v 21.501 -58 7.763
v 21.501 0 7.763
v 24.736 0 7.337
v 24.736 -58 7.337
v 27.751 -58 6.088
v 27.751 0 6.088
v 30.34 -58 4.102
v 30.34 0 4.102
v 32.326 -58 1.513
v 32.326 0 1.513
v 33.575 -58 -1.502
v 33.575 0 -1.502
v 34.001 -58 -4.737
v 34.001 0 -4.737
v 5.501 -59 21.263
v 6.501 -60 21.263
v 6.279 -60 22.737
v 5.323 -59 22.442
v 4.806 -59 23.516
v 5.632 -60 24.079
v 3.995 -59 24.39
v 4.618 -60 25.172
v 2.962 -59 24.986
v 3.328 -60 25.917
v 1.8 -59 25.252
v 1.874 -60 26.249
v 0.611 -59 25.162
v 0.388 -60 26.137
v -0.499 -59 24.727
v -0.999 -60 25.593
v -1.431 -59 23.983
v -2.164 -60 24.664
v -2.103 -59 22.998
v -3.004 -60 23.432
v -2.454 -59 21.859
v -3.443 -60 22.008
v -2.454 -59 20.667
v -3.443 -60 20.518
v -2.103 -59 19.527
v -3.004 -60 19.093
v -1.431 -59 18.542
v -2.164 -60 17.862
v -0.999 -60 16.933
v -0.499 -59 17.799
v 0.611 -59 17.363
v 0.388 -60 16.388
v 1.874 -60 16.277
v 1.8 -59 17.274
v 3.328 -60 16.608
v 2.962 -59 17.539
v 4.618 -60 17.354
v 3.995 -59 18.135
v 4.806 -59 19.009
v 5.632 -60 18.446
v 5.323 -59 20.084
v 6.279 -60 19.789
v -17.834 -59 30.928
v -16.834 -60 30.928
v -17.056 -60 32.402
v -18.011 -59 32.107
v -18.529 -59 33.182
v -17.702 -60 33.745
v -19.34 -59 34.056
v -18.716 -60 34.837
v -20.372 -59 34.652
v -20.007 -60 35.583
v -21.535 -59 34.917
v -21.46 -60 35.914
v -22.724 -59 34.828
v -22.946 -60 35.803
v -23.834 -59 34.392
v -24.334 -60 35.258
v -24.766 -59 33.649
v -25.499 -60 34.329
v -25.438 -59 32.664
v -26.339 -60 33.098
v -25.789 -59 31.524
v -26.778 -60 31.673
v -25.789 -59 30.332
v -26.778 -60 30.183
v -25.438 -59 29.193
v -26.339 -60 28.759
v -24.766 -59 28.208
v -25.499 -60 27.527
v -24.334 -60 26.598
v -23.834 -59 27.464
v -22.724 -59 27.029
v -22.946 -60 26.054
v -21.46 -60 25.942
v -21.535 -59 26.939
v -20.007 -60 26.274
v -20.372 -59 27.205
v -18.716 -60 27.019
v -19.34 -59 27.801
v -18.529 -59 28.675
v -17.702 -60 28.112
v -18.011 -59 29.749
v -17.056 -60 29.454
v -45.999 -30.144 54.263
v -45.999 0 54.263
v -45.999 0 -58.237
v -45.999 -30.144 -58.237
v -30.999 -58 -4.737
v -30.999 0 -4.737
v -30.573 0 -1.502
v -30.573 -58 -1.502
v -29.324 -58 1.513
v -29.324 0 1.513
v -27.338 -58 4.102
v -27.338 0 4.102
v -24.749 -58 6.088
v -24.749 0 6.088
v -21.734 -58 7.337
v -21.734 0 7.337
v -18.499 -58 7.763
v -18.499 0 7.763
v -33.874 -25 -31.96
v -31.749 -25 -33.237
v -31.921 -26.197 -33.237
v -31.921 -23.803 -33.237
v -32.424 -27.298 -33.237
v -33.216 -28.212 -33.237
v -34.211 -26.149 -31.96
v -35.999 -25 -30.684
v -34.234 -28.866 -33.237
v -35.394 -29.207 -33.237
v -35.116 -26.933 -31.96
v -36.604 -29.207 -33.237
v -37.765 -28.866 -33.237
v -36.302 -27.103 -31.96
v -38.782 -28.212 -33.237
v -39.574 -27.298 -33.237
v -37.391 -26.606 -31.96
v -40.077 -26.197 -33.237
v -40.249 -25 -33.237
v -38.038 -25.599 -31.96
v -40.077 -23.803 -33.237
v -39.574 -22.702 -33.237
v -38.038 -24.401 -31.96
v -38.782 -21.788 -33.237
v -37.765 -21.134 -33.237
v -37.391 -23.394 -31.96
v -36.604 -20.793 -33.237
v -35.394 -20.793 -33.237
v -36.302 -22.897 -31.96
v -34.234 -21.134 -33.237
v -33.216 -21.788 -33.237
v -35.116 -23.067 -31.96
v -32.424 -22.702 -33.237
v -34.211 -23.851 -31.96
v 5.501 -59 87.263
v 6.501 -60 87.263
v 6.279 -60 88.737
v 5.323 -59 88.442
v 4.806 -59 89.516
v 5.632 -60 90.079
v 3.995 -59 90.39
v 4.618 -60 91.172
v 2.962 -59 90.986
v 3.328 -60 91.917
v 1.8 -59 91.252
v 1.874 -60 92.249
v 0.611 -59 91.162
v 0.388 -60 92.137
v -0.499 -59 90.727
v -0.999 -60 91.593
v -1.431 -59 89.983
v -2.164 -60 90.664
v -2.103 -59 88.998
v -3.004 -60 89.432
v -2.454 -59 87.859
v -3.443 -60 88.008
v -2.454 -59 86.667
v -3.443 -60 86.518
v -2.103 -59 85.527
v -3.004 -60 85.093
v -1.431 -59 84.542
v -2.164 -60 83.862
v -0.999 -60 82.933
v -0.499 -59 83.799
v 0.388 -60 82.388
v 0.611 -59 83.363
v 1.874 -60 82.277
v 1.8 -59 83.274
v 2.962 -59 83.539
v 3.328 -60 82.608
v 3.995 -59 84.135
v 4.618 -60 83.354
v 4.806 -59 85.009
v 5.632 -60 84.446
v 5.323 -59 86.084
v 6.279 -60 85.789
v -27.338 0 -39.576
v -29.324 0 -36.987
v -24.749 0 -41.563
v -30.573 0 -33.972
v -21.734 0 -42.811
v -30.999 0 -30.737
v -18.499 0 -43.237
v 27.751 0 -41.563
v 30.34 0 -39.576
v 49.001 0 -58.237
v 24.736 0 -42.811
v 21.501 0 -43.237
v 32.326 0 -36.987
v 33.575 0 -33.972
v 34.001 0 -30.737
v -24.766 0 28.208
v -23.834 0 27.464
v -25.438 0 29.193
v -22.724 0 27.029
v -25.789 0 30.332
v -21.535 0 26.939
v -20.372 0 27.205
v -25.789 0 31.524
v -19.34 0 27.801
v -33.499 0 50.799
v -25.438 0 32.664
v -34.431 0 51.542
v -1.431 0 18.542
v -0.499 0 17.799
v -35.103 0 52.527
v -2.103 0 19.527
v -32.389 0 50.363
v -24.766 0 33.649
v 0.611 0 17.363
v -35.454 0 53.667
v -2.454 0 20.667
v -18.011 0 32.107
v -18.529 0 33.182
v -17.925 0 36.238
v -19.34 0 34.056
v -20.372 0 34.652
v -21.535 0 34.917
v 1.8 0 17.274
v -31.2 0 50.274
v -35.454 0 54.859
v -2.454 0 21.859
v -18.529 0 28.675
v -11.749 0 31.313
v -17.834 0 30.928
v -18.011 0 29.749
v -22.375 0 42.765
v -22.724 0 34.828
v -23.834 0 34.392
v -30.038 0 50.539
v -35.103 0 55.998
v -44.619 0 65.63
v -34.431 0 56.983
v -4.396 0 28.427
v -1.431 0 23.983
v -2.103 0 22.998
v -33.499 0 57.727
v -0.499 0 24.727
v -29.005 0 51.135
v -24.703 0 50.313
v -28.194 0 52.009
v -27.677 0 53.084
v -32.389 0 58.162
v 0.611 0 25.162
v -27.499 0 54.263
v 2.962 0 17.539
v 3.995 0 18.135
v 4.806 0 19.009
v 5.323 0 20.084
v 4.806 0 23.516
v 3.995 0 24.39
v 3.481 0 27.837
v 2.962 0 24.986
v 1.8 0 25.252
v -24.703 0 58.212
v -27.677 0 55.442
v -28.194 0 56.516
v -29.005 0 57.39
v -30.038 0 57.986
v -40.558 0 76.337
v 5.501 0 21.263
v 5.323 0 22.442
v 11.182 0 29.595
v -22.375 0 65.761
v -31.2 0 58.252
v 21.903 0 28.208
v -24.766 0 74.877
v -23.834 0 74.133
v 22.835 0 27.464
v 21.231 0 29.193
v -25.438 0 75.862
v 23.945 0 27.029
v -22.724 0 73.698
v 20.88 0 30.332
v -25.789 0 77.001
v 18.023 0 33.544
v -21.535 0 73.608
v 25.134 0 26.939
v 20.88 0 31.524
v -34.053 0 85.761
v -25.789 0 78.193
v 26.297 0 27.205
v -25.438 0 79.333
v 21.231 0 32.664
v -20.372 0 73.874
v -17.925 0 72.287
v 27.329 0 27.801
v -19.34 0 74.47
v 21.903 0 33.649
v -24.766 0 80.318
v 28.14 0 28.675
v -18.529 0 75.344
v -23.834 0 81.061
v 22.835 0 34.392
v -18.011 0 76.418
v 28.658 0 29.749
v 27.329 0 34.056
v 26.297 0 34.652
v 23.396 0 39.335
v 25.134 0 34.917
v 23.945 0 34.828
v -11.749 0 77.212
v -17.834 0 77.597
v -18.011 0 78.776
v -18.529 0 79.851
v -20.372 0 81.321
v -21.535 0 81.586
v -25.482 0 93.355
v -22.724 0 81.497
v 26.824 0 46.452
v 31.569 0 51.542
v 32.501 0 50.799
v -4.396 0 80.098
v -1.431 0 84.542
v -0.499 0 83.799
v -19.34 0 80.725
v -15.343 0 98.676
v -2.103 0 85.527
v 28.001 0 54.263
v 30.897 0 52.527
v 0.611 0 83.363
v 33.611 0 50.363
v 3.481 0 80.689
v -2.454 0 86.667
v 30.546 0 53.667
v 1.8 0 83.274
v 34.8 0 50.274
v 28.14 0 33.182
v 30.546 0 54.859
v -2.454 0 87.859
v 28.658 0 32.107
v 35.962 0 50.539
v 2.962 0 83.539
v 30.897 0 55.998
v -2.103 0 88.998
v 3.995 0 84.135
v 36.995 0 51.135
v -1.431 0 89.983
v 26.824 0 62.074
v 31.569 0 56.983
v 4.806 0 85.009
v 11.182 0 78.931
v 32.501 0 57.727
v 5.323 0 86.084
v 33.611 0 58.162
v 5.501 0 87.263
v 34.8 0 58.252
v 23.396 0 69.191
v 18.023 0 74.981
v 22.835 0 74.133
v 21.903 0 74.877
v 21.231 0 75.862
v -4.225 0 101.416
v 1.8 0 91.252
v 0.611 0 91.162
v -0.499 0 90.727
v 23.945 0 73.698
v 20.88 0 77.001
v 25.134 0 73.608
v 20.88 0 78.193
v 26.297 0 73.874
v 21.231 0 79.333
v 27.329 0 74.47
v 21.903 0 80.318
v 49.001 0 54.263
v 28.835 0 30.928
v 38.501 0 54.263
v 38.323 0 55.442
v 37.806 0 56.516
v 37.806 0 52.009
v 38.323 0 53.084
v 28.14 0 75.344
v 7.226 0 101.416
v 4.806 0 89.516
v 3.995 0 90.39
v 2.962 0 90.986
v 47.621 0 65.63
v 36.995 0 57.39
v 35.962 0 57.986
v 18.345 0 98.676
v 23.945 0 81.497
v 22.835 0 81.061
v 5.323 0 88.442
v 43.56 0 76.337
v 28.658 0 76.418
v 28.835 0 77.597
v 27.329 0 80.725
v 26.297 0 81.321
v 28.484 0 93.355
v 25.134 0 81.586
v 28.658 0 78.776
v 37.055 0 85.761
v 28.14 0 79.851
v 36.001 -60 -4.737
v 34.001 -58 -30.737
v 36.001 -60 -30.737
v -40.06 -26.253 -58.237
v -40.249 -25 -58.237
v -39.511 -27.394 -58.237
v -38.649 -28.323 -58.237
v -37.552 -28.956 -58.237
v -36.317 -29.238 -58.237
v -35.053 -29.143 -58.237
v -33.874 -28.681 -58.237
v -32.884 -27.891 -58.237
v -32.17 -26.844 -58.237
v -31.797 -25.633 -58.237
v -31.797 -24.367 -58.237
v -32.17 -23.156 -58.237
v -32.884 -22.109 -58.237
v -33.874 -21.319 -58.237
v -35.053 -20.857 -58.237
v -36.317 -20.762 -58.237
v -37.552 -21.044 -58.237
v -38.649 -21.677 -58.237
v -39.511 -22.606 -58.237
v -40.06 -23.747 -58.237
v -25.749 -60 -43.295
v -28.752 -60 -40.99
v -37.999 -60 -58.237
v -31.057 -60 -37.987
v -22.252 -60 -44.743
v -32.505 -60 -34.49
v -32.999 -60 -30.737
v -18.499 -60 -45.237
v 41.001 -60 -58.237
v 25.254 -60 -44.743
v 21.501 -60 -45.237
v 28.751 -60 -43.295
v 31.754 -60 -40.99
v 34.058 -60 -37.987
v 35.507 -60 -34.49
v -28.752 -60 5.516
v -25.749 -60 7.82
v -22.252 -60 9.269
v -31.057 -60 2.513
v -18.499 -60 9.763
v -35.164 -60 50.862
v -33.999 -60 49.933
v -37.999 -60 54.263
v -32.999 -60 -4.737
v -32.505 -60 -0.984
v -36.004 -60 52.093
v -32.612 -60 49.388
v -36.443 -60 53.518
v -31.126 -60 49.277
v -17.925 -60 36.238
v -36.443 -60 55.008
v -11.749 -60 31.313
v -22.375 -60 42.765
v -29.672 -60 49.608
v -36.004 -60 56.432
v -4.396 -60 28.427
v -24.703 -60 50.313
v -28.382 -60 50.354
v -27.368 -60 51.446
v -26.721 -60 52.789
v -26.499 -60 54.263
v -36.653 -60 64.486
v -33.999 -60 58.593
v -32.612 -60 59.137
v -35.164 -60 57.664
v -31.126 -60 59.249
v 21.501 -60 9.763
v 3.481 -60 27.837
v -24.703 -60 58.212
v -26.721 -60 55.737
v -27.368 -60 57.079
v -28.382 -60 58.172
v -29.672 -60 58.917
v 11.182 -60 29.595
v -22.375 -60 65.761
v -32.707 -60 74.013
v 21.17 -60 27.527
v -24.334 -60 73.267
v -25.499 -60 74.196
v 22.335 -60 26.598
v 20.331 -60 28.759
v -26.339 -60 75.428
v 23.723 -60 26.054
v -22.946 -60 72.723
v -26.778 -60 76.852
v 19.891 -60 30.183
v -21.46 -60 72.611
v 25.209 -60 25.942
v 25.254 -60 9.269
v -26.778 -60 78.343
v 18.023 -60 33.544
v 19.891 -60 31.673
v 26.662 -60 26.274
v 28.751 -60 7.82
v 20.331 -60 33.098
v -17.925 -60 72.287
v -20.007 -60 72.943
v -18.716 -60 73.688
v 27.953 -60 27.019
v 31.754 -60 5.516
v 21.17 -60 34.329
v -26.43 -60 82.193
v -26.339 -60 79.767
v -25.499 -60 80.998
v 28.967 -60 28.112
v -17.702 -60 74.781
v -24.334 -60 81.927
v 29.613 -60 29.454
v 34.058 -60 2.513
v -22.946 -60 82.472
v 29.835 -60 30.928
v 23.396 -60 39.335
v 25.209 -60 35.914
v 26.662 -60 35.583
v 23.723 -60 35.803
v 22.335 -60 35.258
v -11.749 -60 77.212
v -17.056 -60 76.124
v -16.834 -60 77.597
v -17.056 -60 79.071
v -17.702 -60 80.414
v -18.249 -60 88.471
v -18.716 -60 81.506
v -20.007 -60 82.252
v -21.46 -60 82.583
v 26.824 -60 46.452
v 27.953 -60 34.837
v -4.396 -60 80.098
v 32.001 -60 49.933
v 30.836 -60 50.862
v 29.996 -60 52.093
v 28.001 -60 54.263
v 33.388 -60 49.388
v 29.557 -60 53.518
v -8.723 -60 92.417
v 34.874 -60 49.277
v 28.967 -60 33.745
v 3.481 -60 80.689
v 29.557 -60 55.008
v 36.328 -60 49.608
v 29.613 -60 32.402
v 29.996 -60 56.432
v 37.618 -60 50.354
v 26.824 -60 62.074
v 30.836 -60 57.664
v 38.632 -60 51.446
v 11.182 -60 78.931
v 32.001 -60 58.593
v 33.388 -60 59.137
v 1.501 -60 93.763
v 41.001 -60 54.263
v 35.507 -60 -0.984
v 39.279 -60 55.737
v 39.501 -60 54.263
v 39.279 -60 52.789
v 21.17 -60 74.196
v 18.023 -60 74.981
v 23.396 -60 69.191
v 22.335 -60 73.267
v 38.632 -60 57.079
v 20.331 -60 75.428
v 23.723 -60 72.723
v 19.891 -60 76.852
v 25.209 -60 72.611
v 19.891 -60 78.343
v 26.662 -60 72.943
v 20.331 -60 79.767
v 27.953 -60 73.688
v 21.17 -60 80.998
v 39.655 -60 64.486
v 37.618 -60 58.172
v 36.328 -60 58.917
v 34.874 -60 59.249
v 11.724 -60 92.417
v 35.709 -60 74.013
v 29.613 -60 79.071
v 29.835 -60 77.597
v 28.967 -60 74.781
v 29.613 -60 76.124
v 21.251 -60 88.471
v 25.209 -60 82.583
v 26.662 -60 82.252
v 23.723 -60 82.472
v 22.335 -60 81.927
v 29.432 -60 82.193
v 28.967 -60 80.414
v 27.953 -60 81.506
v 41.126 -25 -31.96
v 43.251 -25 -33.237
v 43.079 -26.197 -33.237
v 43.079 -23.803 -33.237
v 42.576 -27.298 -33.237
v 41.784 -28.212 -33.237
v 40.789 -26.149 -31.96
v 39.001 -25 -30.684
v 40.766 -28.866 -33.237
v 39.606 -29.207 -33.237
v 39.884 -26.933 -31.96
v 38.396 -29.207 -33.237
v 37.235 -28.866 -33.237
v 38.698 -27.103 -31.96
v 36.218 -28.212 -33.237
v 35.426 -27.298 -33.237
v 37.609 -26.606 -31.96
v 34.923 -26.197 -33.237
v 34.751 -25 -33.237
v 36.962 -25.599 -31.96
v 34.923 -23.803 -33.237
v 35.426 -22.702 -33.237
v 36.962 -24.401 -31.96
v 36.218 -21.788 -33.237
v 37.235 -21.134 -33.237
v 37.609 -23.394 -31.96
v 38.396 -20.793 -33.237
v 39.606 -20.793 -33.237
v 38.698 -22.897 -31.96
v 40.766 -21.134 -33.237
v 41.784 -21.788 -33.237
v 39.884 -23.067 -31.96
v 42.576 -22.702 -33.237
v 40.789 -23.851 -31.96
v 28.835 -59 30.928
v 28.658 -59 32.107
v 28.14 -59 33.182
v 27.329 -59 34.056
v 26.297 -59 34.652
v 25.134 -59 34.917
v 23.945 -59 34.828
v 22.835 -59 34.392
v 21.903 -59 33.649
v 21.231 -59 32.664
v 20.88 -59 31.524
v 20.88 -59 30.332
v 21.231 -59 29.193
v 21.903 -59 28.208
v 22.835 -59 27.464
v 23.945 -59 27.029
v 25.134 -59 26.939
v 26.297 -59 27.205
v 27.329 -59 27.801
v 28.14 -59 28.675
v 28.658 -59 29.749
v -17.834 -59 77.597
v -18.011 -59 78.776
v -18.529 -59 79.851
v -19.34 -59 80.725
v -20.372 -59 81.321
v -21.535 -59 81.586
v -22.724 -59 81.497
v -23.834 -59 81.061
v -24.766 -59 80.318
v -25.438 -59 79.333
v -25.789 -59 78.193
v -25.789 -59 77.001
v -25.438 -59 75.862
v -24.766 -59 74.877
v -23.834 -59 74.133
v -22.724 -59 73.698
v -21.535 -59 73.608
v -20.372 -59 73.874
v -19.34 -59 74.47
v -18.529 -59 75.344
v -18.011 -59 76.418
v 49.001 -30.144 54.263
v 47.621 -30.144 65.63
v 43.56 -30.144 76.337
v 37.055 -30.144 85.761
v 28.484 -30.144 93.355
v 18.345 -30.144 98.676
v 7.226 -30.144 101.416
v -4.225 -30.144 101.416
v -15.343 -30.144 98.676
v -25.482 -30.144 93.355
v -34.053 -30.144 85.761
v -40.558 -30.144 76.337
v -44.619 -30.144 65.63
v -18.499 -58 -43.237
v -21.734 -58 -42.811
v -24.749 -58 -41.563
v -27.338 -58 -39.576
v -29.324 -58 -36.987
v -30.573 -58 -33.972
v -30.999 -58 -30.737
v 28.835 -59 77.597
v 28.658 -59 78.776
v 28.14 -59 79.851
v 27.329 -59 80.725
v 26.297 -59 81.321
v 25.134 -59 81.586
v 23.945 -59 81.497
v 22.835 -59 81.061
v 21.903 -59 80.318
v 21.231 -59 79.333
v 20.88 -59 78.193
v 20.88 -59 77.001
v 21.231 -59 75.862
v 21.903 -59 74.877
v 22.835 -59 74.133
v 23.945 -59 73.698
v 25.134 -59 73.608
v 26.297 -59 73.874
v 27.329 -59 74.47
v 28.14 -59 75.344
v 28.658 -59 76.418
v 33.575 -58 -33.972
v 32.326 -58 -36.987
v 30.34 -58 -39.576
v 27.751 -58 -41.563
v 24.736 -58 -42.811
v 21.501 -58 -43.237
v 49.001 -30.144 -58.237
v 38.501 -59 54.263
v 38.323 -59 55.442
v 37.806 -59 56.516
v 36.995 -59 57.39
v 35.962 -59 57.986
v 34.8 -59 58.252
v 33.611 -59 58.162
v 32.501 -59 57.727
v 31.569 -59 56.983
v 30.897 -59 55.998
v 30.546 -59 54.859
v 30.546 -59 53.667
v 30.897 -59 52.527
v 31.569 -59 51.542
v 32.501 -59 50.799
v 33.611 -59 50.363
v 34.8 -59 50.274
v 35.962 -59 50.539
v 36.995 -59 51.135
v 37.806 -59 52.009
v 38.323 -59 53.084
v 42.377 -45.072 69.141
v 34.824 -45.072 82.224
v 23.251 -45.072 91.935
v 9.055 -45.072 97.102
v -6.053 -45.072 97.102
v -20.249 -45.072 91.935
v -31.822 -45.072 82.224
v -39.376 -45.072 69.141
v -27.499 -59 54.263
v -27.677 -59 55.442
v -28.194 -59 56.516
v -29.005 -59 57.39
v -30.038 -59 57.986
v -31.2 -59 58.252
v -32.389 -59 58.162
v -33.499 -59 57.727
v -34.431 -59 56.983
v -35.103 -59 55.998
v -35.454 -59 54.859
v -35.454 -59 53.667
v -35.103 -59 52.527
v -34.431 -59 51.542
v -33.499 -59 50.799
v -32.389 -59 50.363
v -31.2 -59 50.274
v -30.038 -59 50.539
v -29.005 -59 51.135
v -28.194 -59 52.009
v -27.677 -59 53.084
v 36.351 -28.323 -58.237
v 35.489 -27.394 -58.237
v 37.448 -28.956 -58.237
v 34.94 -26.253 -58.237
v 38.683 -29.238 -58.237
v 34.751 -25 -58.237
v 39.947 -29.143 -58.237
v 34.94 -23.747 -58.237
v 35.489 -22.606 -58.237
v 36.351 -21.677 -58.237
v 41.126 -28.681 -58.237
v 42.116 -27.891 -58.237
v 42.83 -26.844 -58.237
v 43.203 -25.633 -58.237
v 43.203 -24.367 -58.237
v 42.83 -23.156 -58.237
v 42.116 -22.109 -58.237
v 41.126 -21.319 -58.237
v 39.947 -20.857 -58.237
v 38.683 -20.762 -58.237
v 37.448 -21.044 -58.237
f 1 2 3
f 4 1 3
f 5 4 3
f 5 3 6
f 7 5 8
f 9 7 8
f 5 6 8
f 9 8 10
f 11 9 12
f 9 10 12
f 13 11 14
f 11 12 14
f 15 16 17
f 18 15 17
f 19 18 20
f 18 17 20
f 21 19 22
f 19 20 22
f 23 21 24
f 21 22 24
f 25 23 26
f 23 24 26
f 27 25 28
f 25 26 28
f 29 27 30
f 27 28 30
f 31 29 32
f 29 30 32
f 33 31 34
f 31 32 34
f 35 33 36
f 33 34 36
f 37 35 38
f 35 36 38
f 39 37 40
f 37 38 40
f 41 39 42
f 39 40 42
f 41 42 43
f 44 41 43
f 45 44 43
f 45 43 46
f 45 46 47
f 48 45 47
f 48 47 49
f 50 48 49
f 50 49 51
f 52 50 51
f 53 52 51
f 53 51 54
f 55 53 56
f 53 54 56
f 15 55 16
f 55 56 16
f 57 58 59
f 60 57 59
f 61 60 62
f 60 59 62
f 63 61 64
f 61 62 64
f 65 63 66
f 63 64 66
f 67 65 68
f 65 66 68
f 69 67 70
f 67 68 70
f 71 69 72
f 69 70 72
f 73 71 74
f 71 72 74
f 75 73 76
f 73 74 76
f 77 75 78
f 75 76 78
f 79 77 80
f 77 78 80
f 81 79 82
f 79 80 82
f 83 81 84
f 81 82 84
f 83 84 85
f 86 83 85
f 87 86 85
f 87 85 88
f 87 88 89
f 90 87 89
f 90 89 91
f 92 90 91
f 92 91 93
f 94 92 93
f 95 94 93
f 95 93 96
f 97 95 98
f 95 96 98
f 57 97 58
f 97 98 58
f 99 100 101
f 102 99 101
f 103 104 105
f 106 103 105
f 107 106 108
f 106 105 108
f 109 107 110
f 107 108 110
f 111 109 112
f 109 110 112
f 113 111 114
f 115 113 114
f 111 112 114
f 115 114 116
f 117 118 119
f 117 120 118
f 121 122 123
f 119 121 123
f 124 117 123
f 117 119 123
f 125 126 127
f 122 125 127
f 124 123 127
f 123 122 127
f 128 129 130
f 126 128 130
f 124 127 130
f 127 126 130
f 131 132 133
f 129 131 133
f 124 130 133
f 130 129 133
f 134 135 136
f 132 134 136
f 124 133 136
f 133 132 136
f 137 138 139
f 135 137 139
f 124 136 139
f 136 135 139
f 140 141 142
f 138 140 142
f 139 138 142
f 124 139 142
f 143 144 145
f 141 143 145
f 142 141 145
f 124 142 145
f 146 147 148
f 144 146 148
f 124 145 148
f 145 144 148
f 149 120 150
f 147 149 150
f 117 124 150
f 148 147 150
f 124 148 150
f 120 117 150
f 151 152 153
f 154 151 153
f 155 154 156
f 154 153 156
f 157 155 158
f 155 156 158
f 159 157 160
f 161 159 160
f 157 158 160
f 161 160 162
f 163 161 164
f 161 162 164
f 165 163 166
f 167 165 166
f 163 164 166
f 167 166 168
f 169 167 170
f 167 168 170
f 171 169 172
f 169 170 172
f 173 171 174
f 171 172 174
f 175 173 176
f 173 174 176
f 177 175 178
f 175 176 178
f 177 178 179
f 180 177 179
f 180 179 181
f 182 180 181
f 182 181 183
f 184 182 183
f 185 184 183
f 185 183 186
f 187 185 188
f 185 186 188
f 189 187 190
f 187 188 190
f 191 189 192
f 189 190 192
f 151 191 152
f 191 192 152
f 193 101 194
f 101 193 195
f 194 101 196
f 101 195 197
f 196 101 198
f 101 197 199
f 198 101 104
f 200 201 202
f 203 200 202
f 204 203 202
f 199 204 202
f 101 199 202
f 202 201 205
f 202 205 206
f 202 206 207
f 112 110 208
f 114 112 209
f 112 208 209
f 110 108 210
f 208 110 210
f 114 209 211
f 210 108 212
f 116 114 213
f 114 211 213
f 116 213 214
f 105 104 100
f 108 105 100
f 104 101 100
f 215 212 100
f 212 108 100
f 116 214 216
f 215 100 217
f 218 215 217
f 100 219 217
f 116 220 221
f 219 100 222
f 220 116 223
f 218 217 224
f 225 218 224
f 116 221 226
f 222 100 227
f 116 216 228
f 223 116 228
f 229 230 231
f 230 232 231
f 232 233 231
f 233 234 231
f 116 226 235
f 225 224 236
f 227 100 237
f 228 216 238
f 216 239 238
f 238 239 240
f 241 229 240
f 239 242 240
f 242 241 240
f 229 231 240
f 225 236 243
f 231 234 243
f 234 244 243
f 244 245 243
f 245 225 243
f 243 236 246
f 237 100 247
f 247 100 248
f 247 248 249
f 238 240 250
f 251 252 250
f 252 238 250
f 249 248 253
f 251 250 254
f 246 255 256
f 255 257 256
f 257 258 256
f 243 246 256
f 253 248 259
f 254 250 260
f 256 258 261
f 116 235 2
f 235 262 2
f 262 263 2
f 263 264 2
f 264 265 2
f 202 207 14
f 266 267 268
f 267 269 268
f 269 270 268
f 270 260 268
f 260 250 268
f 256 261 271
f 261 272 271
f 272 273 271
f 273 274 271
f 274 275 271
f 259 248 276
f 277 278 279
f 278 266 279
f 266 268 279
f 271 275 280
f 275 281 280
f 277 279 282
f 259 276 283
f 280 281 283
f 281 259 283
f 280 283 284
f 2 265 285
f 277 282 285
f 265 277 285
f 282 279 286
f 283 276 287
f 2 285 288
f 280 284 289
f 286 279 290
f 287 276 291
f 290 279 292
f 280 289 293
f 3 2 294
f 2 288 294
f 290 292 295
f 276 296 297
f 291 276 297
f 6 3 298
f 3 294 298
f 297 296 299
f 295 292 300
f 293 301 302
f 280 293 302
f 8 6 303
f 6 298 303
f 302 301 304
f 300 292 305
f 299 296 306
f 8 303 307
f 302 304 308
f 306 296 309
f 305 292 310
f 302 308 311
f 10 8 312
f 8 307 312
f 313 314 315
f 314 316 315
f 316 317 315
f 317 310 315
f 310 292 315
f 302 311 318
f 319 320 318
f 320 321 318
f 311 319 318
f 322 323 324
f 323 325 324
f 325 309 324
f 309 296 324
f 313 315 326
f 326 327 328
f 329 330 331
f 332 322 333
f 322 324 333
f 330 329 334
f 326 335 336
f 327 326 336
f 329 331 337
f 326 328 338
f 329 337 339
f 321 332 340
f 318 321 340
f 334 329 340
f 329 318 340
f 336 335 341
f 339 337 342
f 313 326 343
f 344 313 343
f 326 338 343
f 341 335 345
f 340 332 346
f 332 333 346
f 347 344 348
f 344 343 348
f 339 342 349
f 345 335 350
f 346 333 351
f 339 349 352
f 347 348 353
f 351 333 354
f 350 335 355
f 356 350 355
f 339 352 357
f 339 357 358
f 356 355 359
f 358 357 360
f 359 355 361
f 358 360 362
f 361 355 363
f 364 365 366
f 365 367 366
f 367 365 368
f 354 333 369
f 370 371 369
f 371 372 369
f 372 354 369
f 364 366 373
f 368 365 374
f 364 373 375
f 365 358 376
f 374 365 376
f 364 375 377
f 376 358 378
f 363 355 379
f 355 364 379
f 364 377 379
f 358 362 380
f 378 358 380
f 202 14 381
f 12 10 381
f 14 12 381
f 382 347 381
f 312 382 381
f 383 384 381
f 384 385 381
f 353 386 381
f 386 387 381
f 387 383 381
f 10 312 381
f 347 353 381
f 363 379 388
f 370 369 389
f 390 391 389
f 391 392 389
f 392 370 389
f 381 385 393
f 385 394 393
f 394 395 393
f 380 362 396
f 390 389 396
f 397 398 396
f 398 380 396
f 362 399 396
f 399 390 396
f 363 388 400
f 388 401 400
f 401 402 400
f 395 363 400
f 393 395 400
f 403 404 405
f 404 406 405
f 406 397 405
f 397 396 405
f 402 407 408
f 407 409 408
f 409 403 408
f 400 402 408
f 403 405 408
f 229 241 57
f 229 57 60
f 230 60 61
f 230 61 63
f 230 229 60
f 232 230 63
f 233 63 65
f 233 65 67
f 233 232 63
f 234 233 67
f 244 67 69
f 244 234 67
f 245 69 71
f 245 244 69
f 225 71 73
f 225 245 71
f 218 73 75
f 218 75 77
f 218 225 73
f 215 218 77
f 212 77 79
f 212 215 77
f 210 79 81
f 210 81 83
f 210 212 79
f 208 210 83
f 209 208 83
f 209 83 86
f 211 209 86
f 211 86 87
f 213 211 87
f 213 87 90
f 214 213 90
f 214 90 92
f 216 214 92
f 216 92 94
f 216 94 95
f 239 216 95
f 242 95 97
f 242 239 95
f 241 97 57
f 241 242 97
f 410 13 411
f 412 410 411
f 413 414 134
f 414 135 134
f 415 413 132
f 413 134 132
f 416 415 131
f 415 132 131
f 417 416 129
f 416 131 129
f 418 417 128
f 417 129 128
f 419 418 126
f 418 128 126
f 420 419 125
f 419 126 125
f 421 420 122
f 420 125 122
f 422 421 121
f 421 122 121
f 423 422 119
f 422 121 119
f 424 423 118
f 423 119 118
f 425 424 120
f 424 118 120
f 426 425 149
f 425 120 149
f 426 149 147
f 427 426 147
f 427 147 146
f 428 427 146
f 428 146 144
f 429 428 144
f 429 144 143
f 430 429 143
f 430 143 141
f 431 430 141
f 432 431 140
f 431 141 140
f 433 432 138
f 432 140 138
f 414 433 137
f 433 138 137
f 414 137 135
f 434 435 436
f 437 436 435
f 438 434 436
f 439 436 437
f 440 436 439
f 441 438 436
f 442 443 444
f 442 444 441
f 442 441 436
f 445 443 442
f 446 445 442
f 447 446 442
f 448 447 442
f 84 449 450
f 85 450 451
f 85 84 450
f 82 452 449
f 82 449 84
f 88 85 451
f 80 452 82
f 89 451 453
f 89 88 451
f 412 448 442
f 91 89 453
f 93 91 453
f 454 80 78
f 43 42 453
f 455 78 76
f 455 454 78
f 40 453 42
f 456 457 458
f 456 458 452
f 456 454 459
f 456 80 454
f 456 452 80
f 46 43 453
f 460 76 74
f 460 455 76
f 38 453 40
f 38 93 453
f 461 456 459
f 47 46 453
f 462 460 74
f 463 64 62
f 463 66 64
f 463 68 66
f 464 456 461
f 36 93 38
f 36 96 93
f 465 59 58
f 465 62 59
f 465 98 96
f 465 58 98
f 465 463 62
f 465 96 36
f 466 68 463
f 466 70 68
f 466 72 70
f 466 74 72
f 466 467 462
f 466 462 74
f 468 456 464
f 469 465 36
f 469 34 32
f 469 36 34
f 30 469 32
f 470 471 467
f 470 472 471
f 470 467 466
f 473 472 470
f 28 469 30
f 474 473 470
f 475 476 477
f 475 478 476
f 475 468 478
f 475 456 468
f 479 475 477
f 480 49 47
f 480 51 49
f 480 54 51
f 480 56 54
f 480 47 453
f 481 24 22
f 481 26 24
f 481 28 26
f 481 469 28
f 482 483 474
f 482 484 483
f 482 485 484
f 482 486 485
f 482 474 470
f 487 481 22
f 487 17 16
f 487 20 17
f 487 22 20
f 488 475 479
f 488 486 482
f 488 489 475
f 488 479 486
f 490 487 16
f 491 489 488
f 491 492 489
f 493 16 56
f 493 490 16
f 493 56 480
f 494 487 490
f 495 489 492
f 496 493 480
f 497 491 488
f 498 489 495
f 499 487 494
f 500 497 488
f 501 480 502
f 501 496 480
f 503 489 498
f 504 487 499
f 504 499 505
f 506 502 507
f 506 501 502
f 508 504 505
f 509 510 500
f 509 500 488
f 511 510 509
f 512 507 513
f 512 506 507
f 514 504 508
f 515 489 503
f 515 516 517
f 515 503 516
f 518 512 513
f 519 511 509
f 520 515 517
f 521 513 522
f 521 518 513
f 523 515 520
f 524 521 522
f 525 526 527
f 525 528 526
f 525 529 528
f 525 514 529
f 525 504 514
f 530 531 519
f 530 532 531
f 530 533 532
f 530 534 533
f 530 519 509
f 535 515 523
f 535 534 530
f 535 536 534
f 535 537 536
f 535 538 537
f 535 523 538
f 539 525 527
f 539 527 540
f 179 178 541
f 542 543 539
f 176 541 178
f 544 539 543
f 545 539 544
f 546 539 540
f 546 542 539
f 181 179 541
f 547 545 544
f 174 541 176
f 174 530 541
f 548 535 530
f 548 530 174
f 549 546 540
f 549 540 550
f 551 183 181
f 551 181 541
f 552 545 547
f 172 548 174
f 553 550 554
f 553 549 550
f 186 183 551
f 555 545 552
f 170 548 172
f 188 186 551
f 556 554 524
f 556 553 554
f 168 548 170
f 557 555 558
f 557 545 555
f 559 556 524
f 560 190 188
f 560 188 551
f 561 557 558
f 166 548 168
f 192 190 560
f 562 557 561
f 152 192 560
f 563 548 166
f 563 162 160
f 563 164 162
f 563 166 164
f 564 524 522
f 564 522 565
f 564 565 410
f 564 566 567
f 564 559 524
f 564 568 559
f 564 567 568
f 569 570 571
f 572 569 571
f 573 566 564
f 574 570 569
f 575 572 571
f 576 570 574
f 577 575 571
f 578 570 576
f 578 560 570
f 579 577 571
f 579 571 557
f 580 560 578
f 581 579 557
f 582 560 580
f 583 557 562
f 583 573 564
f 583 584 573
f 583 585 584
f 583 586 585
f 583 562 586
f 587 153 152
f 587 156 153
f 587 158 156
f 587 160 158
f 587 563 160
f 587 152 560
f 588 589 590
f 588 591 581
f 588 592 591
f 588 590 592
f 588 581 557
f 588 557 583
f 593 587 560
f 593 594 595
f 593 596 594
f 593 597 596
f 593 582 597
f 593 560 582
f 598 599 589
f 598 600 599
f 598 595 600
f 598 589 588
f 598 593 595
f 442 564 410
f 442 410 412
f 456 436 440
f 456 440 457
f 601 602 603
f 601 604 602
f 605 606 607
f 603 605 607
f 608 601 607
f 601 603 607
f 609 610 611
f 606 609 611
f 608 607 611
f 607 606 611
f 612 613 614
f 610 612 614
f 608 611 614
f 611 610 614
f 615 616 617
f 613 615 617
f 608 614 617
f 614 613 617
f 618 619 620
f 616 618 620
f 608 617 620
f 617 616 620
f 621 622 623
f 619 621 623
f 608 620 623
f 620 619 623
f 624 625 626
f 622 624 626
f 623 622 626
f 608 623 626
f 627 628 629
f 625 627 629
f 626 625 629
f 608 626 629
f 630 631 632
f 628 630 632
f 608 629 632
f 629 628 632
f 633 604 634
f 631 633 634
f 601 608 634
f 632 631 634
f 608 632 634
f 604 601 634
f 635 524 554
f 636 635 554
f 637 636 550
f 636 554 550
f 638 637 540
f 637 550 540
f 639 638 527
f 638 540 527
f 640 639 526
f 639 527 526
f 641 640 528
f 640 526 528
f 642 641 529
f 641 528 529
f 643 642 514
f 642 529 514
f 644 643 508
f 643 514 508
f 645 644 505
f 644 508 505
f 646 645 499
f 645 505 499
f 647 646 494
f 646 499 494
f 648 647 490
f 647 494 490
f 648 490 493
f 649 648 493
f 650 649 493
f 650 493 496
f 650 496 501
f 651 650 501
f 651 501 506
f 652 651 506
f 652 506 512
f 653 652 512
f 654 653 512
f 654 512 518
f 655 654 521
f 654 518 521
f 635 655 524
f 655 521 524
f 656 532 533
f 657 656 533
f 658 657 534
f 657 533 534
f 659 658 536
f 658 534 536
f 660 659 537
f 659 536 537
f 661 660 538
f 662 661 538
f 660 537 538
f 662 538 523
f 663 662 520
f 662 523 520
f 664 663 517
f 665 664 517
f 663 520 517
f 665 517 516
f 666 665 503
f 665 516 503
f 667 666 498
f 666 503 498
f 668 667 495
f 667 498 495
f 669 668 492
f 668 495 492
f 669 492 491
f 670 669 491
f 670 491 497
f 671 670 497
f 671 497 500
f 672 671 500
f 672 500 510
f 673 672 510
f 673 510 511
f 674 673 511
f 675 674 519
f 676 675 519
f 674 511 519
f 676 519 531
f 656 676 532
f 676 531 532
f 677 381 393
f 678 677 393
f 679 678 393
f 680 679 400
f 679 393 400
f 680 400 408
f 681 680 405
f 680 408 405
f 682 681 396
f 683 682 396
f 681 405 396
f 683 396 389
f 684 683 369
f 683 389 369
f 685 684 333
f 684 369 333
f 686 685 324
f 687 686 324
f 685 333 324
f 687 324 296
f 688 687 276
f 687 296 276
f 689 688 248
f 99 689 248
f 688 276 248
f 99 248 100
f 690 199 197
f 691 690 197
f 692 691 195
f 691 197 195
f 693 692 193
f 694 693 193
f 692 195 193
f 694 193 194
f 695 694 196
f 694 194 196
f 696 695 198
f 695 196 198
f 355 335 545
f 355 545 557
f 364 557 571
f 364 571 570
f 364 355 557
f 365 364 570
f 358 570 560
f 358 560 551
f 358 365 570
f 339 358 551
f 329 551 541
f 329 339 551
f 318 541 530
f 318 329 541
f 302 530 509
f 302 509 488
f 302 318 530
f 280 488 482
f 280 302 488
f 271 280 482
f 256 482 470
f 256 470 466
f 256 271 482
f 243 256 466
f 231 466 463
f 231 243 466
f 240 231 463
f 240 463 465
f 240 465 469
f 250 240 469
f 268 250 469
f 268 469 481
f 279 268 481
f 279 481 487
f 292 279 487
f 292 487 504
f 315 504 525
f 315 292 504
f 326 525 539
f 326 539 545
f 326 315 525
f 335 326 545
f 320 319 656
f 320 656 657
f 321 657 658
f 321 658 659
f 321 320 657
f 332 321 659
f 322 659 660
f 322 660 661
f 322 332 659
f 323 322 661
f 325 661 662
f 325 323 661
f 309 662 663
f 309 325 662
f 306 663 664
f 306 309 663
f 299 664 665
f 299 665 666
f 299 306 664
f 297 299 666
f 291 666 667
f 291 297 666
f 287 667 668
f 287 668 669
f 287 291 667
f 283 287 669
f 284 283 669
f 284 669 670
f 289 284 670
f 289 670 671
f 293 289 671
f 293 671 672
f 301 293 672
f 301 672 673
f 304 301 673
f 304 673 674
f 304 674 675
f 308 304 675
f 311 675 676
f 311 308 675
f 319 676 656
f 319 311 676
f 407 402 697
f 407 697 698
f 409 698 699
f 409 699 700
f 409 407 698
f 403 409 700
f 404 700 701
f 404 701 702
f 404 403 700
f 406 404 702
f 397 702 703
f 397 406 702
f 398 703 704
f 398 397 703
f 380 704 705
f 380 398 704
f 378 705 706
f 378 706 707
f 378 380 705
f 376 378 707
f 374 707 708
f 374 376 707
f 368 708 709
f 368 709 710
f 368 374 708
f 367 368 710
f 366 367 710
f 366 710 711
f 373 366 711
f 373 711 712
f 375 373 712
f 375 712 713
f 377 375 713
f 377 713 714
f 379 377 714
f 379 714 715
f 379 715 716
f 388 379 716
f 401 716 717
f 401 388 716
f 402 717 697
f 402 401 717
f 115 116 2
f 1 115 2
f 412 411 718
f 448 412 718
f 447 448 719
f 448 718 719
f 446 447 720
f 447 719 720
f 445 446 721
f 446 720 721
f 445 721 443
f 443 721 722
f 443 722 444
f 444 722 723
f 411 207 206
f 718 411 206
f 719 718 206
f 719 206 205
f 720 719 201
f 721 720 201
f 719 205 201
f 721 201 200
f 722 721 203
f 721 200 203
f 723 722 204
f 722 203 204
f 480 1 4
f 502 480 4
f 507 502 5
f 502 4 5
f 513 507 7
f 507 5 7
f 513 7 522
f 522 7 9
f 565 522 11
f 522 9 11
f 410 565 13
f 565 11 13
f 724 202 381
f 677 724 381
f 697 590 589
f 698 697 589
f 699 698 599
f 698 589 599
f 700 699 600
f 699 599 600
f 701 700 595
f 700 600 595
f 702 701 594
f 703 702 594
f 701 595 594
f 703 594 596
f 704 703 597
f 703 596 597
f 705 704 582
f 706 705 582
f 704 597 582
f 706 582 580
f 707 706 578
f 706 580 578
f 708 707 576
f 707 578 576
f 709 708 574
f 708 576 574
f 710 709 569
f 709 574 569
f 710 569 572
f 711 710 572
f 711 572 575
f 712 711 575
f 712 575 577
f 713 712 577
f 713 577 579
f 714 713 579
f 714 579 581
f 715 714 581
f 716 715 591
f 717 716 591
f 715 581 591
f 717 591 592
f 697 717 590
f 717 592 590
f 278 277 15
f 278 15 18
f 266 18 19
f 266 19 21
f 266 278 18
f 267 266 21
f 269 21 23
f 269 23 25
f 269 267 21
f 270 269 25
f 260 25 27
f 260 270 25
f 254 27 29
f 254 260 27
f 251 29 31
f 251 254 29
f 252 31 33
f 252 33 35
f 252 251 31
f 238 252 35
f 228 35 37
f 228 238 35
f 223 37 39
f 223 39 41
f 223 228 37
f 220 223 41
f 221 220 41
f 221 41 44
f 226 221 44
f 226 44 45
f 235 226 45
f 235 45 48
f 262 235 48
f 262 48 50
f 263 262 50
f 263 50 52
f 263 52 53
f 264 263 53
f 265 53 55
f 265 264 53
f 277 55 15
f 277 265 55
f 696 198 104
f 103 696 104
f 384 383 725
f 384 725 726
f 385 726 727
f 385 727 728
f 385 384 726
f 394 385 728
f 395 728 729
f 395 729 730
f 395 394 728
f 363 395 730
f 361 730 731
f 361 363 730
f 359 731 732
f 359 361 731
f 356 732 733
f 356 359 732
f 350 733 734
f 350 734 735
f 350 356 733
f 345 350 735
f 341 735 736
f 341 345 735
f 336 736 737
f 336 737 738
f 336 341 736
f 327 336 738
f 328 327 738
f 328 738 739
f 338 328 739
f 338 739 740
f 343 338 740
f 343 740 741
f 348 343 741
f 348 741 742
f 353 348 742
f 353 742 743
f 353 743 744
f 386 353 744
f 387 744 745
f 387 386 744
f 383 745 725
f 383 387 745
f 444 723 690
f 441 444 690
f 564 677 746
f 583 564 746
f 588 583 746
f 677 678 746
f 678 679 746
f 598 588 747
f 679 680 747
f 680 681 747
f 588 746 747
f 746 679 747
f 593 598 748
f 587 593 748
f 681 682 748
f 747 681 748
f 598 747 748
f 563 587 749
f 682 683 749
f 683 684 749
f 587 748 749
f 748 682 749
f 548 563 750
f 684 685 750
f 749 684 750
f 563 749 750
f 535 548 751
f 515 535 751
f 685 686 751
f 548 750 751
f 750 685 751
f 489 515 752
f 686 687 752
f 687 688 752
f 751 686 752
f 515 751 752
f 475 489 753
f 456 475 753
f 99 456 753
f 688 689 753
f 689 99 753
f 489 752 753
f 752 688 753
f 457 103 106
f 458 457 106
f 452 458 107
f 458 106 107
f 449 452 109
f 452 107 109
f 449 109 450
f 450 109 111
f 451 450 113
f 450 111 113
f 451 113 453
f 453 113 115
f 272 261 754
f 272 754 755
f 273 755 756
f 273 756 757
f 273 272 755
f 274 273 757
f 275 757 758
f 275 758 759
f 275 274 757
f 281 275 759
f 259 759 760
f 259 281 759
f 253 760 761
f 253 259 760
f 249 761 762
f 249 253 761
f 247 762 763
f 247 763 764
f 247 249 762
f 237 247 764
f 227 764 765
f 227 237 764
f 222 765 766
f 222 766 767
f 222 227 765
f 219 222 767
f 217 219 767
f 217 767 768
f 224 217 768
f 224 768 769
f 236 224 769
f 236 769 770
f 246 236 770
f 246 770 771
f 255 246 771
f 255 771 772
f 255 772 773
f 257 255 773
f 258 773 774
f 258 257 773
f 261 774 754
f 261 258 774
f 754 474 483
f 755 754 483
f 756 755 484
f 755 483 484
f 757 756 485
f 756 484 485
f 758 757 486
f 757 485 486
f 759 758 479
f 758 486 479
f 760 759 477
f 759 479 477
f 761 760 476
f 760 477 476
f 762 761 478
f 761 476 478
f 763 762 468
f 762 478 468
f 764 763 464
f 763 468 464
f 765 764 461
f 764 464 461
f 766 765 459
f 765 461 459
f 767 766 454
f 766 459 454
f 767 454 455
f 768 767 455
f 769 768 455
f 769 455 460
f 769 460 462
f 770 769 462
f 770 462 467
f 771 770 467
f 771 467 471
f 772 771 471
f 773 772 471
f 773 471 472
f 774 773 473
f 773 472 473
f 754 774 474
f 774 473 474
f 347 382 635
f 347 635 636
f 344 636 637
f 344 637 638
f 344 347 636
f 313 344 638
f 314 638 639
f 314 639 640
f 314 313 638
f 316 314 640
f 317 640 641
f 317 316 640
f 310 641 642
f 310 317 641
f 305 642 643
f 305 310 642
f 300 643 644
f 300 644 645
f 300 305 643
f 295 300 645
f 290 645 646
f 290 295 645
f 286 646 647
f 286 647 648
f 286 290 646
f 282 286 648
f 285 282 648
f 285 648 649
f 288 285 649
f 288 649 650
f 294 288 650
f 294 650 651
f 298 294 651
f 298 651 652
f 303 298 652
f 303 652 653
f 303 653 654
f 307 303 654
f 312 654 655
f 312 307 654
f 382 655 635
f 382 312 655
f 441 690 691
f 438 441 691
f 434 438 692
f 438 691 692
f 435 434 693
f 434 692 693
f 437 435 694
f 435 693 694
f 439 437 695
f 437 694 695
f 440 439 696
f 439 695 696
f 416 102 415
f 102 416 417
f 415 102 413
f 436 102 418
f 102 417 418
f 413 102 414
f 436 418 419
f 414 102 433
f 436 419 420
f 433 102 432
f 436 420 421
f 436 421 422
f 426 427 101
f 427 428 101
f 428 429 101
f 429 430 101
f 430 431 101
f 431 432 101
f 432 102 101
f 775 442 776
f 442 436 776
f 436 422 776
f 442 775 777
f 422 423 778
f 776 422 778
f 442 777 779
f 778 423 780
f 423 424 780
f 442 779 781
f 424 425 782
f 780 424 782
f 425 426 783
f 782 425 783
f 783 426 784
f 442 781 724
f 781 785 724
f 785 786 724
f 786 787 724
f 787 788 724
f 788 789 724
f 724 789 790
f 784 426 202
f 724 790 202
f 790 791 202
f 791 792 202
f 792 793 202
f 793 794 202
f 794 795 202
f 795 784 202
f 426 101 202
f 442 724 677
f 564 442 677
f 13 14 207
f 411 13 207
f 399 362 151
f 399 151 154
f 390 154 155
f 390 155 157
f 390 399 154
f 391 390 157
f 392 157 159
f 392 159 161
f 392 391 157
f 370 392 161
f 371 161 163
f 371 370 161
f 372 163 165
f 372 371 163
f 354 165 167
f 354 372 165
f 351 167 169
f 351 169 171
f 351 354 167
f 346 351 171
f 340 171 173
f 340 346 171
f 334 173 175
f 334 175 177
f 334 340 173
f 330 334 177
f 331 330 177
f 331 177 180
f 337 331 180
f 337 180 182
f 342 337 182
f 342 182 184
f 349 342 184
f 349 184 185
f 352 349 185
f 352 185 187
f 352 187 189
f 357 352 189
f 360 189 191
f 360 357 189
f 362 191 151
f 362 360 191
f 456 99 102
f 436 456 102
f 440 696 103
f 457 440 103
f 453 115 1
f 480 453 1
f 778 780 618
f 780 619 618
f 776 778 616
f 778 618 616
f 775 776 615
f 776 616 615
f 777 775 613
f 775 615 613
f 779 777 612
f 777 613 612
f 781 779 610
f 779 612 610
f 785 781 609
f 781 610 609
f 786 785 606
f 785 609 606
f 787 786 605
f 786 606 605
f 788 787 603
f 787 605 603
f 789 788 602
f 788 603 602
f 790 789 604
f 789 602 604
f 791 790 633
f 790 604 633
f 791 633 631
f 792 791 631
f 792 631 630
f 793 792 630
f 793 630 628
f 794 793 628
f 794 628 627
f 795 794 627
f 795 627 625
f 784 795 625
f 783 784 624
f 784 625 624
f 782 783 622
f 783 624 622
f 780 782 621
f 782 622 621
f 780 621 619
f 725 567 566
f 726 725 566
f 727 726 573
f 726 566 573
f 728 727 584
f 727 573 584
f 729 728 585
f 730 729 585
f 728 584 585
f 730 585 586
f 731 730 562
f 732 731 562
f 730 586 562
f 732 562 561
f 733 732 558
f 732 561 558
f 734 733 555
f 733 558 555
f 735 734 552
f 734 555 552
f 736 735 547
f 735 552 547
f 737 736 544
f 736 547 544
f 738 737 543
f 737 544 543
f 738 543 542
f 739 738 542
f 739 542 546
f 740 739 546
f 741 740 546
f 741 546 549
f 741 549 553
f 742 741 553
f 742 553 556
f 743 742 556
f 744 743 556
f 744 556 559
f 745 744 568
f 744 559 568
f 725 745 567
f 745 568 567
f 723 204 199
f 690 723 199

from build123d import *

# Parameters (mm, degrees)
F0_R     = 4
F0_R_2   = 26.5
F1_DEPTH = 60
F2_SIZE  = 1
F3_SIZE  = 2
F4_SIZE2 = 29.8564064606
F4_SIZE  = 8
F6_D     = 8.5
F6_DEPTH = 25
F6_TIP   = 2.5536576309


with BuildPart() as f1:
    # F0 (on Front) → F1 (new body)
    with BuildSketch(Plane.XZ):
        with BuildLine():
            Line((-45.9991587698, 54.2627746064), (-45.9991587698, -58.2372253936))
            Line((-45.9991587698, -58.2372253936), (49.0008412302, -58.2372253936))
            Line((49.0008412302, -58.2372253936), (49.0008412302, 54.2627746064))
            ThreePointArc((49.0008412302, 54.2627746064), (1.5008412302, 101.7627746064), (-45.9991587698, 54.2627746064))
        make_face()
        with BuildLine():
            ThreePointArc((-30.9991587698, -4.7372253936), (-27.3379935347, 4.1016093712), (-18.4991587698, 7.7627746064))
            Line((-18.4991587698, 7.7627746064), (21.5008412302, 7.7627746064))
            ThreePointArc((21.5008412302, 7.7627746064), (30.339675995, 4.1016093712), (34.0008412302, -4.7372253936))
            Line((34.0008412302, -4.7372253936), (34.0008412302, -30.7372253936))
            ThreePointArc((34.0008412302, -30.7372253936), (30.339675995, -39.5760601585), (21.5008412302, -43.2372253936))
            Line((21.5008412302, -43.2372253936), (-18.4991587698, -43.2372253936))
            ThreePointArc((-18.4991587698, -43.2372253936), (-27.3379935347, -39.5760601585), (-30.9991587698, -30.7372253936))
            Line((-30.9991587698, -30.7372253936), (-30.9991587698, -4.7372253936))
        make_face(mode=Mode.SUBTRACT)
        with Locations((1.5008412302, 21.2627746064)):
            Circle(F0_R, mode=Mode.SUBTRACT)
        with Locations((-31.4991587698, 54.2627746064)):
            Circle(F0_R, mode=Mode.SUBTRACT)
        with Locations((-21.833682549, 30.9282508272)):
            Circle(F0_R, mode=Mode.SUBTRACT)
        with Locations((1.5008412302, 54.2627746064)):
            Circle(F0_R_2, mode=Mode.SUBTRACT)
        with Locations((-21.833682549, 77.5972983855)):
            Circle(F0_R, mode=Mode.SUBTRACT)
        with Locations((1.5008412302, 87.2627746064)):
            Circle(F0_R, mode=Mode.SUBTRACT)
        with Locations((24.8353650093, 30.9282508272)):
            Circle(F0_R, mode=Mode.SUBTRACT)
        with Locations((34.5008412302, 54.2627746064)):
            Circle(F0_R, mode=Mode.SUBTRACT)
        with Locations((24.8353650093, 77.5972983855)):
            Circle(F0_R, mode=Mode.SUBTRACT)
    extrude(amount=F1_DEPTH)

    # F2
    f2_edges = [f1.edges().sort_by_distance(p)[0] for p in [
        (-35.499159, -60, 54.262775),
        (-25.833683, -60, 77.597298),
        (-2.499159, -60, 87.262775),
        (20.835365, -60, 77.597298),
        (30.500841, -60, 54.262775),
        (20.835365, -60, 30.928251),
        (-2.499159, -60, 21.262775),
        (-25.833683, -60, 30.928251),
    ]]
    chamfer(f2_edges, length=F2_SIZE)

    # F3
    f3_edges = [f1.edges().sort_by_distance(p)[0] for p in [
        (1.500841, -60, 7.762775),
    ]]
    chamfer(f3_edges, length=F3_SIZE)

    # F4
    f4_edges = [f1.edges().sort_by_distance(p)[0] for p in [
        (1.500841, -60, 101.762775),
    ]]
    f4_side = f1.faces().sort_by_distance((1.500841, -60, 11.623554))[0]
    chamfer(f4_edges, length=F4_SIZE, length2=F4_SIZE2, reference=f4_side)

    # F6
    with Locations(Plane(origin=(0, 0, -58.2372253936), x_dir=(1, 0, 0), z_dir=(0, 0, -1))):
        with Locations((-35.9991587698, 25), (39.0008412302, 25)):
            Hole(F6_D / 2, depth=F6_DEPTH)
            with Locations((0, 0, -(F6_DEPTH + F6_TIP / 2))):  # 118° drill point
                Cone(0, F6_D / 2, F6_TIP, mode=Mode.SUBTRACT)


solid = f1.part
